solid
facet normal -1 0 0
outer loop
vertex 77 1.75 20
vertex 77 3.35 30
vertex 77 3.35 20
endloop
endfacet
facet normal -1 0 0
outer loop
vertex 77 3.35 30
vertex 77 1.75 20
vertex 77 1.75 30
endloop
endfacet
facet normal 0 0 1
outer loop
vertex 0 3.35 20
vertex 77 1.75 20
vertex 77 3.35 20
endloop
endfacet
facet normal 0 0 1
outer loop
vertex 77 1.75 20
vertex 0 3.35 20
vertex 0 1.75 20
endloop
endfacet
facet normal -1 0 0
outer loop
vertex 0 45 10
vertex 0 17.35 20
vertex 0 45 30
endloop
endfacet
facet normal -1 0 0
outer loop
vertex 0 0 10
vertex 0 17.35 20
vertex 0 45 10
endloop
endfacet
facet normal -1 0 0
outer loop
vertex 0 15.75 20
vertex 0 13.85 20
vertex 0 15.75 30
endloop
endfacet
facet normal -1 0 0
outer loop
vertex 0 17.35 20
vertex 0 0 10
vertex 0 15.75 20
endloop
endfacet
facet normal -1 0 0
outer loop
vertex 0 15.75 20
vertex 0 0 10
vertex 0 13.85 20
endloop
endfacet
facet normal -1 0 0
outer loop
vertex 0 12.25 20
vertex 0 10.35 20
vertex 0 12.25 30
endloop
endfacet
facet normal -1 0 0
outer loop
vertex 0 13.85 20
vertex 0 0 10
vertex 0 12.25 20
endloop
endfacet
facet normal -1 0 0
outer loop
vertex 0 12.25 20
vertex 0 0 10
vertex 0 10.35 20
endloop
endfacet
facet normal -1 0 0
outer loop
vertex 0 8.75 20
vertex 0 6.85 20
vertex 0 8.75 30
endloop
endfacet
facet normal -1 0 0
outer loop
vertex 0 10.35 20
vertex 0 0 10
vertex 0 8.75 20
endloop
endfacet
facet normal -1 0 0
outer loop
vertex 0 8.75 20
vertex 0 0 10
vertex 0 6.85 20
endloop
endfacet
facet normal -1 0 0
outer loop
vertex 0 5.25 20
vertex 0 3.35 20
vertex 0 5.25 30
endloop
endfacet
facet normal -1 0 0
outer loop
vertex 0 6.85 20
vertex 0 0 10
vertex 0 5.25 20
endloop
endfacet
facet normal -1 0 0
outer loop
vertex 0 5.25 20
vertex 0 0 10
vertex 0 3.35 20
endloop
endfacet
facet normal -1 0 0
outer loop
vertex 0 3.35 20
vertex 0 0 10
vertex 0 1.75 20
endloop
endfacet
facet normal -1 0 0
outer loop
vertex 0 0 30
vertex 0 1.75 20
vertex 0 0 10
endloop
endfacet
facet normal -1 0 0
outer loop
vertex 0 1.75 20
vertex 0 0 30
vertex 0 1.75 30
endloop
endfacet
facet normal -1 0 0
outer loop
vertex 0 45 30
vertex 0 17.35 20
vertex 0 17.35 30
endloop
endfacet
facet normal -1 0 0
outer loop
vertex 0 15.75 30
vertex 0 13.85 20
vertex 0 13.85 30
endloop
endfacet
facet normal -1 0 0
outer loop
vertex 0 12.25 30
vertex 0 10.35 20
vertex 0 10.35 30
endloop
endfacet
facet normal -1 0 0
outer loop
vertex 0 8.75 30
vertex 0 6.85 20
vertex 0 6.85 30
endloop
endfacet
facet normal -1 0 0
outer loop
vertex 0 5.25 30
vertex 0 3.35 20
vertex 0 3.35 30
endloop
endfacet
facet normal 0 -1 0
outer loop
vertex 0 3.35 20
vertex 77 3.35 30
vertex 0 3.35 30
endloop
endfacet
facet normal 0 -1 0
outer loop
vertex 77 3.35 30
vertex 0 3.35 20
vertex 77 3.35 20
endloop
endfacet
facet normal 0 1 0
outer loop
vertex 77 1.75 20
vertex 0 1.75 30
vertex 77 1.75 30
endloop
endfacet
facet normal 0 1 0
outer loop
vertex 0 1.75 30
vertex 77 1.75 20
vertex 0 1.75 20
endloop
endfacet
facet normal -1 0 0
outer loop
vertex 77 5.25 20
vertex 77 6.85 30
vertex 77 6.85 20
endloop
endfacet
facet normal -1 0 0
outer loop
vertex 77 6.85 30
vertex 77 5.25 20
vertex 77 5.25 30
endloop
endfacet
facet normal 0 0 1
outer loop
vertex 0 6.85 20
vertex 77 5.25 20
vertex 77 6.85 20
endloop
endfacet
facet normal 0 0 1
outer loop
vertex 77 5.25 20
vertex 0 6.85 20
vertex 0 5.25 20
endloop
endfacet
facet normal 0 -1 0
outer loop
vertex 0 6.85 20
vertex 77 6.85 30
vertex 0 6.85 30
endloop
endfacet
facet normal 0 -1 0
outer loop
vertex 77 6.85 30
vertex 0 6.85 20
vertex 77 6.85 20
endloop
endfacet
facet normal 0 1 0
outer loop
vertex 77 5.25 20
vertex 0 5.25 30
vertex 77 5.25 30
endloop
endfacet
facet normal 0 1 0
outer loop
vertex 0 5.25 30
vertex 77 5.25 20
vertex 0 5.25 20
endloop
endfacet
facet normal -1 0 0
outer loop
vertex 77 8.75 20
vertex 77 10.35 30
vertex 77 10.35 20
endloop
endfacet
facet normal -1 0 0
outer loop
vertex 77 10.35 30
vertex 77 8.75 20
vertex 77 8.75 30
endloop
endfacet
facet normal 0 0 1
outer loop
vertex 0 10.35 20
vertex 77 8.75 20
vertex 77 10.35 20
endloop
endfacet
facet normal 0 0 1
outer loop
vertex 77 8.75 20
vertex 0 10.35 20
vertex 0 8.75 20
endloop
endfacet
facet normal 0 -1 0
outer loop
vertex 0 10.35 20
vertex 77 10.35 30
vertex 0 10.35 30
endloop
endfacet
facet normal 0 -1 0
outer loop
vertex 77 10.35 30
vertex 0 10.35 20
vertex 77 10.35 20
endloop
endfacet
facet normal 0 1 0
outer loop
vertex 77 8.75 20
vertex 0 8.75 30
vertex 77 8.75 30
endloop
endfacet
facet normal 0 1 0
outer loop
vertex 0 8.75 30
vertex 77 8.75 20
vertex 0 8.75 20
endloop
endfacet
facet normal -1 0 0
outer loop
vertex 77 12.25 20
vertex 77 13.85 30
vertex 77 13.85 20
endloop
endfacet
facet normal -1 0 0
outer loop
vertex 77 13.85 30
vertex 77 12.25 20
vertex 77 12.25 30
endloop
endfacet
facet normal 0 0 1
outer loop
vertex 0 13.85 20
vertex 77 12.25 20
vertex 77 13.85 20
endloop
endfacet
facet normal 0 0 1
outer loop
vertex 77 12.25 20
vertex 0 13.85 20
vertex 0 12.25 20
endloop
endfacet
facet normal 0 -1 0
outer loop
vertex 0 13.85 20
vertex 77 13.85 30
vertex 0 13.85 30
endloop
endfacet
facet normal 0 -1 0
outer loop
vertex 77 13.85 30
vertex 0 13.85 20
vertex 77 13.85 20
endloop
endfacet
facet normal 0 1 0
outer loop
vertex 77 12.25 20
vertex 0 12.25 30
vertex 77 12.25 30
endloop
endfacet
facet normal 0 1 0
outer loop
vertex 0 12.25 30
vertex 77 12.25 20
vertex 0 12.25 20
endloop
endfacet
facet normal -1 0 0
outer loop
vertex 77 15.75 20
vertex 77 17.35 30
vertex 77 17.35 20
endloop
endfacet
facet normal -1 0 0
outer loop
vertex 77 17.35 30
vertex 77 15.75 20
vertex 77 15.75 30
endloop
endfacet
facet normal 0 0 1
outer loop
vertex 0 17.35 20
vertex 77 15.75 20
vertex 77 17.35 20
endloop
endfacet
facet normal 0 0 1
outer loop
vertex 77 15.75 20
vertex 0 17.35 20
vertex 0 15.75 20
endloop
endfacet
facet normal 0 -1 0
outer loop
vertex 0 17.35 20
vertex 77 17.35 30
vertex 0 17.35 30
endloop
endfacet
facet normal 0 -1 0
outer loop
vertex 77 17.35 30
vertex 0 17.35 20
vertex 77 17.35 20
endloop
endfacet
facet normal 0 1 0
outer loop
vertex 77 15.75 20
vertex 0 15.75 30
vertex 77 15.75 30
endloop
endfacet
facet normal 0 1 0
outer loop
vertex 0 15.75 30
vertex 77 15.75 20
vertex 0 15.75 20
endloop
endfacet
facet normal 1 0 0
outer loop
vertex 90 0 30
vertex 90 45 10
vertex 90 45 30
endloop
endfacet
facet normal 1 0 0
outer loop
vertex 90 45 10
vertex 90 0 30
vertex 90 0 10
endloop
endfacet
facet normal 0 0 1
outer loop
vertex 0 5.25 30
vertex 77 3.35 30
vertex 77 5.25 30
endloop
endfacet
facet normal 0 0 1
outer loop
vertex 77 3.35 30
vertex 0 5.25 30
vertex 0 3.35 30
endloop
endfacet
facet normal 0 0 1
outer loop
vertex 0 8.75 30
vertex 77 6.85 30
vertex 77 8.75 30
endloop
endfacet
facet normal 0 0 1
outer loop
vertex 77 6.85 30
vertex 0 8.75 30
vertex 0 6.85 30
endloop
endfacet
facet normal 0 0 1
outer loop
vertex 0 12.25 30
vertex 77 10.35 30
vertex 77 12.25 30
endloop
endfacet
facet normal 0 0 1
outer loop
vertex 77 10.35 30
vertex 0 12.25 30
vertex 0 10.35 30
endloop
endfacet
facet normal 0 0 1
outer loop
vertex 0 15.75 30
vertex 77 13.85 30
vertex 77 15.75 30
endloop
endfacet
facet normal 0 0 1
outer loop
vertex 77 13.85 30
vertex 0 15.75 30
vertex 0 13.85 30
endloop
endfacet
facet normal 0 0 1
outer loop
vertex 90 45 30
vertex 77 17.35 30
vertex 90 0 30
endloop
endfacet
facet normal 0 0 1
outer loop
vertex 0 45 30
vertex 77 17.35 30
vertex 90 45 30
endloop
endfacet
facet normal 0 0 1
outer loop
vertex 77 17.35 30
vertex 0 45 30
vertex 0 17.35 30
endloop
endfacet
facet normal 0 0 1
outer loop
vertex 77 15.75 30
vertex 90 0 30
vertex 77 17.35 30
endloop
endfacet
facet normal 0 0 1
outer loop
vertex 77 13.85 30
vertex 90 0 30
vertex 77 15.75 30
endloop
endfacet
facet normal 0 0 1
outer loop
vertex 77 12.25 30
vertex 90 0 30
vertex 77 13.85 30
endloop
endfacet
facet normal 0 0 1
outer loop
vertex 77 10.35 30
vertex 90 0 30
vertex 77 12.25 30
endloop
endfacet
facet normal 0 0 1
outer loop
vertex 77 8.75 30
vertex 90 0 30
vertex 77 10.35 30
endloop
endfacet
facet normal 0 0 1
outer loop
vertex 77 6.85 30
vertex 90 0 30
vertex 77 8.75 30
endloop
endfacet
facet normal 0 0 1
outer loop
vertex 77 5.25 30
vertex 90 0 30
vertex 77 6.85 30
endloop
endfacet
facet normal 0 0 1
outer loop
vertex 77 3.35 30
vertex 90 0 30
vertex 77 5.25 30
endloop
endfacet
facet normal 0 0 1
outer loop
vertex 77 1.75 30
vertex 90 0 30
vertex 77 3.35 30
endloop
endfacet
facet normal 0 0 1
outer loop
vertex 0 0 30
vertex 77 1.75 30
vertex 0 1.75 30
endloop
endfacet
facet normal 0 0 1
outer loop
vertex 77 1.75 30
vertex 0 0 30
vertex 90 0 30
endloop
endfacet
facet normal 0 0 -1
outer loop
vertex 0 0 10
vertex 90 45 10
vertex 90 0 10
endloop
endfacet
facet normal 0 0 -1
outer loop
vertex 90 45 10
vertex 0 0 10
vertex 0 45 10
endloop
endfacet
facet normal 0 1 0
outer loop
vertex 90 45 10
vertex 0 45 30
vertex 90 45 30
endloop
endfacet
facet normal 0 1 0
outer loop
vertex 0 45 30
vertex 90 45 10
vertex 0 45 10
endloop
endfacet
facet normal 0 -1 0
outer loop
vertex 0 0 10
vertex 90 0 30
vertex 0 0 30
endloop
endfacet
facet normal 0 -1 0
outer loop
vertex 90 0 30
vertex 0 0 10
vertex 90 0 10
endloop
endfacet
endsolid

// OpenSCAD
// Drying Rack for 10 Microscope Slides
// Base: 90 x 45 x 20 mm (Resting on Z=0)
// Slots: 10 parallel slots along X, 77mm long, 1.6mm wide, 10mm deep
// Spacing: 3.5mm centre-to-centre in Y

$fn = 128;

// Base Dimensions
base_length = 90;   // X
base_width = 45;    // Y
base_height = 20;   // Z

// Slot Dimensions
num_slots = 10;
slot_length = 77;   // X (runs along length)
slot_width = 1.6;   // Y
slot_depth = 10;    // Z

// Spacing
slot_spacing = 3.5; // Centre-to-centre in Y

// Main Block
difference() {
    // 1. The Solid Base
    // Shifted up by base_height/2 so it rests on Z=0
    translate([0, 0, base_height / 2]) {
        cube([base_length, base_width, base_height]);
    }
    
    // 2. The Slots (Cutting shapes)
    // The slots are open at the top. The top surface is now at Z = base_height (20).
    // The slots go from Z=20 down to Z=10 (10mm deep).
    // We extend the cutting shape slightly below Z=10 (to Z=9.9) to ensure clean removal.
    
    // Calculate the Y offset for the first slot to center the group on the block width
    // The group of centers must be centered at Y=0.
    first_slot_y = -((num_slots - 1) * slot_spacing) / 2;
    
    for (i = [0 : num_slots - 1]) {
        y_pos = first_slot_y + (i * slot_spacing);
        
        translate([0, y_pos, base_height]) {
            // Slot dimensions:
            // X: 77mm
            // Y: 1.6mm
            // Z: 10mm deep (from Z=20 down to Z=10)
            // We add 0.1mm extension below Z=10 for clean cutting
            cube([slot_length, slot_width, slot_depth + 0.1], center = [0, 0, -slot_depth/2]);
        }
    }
}
